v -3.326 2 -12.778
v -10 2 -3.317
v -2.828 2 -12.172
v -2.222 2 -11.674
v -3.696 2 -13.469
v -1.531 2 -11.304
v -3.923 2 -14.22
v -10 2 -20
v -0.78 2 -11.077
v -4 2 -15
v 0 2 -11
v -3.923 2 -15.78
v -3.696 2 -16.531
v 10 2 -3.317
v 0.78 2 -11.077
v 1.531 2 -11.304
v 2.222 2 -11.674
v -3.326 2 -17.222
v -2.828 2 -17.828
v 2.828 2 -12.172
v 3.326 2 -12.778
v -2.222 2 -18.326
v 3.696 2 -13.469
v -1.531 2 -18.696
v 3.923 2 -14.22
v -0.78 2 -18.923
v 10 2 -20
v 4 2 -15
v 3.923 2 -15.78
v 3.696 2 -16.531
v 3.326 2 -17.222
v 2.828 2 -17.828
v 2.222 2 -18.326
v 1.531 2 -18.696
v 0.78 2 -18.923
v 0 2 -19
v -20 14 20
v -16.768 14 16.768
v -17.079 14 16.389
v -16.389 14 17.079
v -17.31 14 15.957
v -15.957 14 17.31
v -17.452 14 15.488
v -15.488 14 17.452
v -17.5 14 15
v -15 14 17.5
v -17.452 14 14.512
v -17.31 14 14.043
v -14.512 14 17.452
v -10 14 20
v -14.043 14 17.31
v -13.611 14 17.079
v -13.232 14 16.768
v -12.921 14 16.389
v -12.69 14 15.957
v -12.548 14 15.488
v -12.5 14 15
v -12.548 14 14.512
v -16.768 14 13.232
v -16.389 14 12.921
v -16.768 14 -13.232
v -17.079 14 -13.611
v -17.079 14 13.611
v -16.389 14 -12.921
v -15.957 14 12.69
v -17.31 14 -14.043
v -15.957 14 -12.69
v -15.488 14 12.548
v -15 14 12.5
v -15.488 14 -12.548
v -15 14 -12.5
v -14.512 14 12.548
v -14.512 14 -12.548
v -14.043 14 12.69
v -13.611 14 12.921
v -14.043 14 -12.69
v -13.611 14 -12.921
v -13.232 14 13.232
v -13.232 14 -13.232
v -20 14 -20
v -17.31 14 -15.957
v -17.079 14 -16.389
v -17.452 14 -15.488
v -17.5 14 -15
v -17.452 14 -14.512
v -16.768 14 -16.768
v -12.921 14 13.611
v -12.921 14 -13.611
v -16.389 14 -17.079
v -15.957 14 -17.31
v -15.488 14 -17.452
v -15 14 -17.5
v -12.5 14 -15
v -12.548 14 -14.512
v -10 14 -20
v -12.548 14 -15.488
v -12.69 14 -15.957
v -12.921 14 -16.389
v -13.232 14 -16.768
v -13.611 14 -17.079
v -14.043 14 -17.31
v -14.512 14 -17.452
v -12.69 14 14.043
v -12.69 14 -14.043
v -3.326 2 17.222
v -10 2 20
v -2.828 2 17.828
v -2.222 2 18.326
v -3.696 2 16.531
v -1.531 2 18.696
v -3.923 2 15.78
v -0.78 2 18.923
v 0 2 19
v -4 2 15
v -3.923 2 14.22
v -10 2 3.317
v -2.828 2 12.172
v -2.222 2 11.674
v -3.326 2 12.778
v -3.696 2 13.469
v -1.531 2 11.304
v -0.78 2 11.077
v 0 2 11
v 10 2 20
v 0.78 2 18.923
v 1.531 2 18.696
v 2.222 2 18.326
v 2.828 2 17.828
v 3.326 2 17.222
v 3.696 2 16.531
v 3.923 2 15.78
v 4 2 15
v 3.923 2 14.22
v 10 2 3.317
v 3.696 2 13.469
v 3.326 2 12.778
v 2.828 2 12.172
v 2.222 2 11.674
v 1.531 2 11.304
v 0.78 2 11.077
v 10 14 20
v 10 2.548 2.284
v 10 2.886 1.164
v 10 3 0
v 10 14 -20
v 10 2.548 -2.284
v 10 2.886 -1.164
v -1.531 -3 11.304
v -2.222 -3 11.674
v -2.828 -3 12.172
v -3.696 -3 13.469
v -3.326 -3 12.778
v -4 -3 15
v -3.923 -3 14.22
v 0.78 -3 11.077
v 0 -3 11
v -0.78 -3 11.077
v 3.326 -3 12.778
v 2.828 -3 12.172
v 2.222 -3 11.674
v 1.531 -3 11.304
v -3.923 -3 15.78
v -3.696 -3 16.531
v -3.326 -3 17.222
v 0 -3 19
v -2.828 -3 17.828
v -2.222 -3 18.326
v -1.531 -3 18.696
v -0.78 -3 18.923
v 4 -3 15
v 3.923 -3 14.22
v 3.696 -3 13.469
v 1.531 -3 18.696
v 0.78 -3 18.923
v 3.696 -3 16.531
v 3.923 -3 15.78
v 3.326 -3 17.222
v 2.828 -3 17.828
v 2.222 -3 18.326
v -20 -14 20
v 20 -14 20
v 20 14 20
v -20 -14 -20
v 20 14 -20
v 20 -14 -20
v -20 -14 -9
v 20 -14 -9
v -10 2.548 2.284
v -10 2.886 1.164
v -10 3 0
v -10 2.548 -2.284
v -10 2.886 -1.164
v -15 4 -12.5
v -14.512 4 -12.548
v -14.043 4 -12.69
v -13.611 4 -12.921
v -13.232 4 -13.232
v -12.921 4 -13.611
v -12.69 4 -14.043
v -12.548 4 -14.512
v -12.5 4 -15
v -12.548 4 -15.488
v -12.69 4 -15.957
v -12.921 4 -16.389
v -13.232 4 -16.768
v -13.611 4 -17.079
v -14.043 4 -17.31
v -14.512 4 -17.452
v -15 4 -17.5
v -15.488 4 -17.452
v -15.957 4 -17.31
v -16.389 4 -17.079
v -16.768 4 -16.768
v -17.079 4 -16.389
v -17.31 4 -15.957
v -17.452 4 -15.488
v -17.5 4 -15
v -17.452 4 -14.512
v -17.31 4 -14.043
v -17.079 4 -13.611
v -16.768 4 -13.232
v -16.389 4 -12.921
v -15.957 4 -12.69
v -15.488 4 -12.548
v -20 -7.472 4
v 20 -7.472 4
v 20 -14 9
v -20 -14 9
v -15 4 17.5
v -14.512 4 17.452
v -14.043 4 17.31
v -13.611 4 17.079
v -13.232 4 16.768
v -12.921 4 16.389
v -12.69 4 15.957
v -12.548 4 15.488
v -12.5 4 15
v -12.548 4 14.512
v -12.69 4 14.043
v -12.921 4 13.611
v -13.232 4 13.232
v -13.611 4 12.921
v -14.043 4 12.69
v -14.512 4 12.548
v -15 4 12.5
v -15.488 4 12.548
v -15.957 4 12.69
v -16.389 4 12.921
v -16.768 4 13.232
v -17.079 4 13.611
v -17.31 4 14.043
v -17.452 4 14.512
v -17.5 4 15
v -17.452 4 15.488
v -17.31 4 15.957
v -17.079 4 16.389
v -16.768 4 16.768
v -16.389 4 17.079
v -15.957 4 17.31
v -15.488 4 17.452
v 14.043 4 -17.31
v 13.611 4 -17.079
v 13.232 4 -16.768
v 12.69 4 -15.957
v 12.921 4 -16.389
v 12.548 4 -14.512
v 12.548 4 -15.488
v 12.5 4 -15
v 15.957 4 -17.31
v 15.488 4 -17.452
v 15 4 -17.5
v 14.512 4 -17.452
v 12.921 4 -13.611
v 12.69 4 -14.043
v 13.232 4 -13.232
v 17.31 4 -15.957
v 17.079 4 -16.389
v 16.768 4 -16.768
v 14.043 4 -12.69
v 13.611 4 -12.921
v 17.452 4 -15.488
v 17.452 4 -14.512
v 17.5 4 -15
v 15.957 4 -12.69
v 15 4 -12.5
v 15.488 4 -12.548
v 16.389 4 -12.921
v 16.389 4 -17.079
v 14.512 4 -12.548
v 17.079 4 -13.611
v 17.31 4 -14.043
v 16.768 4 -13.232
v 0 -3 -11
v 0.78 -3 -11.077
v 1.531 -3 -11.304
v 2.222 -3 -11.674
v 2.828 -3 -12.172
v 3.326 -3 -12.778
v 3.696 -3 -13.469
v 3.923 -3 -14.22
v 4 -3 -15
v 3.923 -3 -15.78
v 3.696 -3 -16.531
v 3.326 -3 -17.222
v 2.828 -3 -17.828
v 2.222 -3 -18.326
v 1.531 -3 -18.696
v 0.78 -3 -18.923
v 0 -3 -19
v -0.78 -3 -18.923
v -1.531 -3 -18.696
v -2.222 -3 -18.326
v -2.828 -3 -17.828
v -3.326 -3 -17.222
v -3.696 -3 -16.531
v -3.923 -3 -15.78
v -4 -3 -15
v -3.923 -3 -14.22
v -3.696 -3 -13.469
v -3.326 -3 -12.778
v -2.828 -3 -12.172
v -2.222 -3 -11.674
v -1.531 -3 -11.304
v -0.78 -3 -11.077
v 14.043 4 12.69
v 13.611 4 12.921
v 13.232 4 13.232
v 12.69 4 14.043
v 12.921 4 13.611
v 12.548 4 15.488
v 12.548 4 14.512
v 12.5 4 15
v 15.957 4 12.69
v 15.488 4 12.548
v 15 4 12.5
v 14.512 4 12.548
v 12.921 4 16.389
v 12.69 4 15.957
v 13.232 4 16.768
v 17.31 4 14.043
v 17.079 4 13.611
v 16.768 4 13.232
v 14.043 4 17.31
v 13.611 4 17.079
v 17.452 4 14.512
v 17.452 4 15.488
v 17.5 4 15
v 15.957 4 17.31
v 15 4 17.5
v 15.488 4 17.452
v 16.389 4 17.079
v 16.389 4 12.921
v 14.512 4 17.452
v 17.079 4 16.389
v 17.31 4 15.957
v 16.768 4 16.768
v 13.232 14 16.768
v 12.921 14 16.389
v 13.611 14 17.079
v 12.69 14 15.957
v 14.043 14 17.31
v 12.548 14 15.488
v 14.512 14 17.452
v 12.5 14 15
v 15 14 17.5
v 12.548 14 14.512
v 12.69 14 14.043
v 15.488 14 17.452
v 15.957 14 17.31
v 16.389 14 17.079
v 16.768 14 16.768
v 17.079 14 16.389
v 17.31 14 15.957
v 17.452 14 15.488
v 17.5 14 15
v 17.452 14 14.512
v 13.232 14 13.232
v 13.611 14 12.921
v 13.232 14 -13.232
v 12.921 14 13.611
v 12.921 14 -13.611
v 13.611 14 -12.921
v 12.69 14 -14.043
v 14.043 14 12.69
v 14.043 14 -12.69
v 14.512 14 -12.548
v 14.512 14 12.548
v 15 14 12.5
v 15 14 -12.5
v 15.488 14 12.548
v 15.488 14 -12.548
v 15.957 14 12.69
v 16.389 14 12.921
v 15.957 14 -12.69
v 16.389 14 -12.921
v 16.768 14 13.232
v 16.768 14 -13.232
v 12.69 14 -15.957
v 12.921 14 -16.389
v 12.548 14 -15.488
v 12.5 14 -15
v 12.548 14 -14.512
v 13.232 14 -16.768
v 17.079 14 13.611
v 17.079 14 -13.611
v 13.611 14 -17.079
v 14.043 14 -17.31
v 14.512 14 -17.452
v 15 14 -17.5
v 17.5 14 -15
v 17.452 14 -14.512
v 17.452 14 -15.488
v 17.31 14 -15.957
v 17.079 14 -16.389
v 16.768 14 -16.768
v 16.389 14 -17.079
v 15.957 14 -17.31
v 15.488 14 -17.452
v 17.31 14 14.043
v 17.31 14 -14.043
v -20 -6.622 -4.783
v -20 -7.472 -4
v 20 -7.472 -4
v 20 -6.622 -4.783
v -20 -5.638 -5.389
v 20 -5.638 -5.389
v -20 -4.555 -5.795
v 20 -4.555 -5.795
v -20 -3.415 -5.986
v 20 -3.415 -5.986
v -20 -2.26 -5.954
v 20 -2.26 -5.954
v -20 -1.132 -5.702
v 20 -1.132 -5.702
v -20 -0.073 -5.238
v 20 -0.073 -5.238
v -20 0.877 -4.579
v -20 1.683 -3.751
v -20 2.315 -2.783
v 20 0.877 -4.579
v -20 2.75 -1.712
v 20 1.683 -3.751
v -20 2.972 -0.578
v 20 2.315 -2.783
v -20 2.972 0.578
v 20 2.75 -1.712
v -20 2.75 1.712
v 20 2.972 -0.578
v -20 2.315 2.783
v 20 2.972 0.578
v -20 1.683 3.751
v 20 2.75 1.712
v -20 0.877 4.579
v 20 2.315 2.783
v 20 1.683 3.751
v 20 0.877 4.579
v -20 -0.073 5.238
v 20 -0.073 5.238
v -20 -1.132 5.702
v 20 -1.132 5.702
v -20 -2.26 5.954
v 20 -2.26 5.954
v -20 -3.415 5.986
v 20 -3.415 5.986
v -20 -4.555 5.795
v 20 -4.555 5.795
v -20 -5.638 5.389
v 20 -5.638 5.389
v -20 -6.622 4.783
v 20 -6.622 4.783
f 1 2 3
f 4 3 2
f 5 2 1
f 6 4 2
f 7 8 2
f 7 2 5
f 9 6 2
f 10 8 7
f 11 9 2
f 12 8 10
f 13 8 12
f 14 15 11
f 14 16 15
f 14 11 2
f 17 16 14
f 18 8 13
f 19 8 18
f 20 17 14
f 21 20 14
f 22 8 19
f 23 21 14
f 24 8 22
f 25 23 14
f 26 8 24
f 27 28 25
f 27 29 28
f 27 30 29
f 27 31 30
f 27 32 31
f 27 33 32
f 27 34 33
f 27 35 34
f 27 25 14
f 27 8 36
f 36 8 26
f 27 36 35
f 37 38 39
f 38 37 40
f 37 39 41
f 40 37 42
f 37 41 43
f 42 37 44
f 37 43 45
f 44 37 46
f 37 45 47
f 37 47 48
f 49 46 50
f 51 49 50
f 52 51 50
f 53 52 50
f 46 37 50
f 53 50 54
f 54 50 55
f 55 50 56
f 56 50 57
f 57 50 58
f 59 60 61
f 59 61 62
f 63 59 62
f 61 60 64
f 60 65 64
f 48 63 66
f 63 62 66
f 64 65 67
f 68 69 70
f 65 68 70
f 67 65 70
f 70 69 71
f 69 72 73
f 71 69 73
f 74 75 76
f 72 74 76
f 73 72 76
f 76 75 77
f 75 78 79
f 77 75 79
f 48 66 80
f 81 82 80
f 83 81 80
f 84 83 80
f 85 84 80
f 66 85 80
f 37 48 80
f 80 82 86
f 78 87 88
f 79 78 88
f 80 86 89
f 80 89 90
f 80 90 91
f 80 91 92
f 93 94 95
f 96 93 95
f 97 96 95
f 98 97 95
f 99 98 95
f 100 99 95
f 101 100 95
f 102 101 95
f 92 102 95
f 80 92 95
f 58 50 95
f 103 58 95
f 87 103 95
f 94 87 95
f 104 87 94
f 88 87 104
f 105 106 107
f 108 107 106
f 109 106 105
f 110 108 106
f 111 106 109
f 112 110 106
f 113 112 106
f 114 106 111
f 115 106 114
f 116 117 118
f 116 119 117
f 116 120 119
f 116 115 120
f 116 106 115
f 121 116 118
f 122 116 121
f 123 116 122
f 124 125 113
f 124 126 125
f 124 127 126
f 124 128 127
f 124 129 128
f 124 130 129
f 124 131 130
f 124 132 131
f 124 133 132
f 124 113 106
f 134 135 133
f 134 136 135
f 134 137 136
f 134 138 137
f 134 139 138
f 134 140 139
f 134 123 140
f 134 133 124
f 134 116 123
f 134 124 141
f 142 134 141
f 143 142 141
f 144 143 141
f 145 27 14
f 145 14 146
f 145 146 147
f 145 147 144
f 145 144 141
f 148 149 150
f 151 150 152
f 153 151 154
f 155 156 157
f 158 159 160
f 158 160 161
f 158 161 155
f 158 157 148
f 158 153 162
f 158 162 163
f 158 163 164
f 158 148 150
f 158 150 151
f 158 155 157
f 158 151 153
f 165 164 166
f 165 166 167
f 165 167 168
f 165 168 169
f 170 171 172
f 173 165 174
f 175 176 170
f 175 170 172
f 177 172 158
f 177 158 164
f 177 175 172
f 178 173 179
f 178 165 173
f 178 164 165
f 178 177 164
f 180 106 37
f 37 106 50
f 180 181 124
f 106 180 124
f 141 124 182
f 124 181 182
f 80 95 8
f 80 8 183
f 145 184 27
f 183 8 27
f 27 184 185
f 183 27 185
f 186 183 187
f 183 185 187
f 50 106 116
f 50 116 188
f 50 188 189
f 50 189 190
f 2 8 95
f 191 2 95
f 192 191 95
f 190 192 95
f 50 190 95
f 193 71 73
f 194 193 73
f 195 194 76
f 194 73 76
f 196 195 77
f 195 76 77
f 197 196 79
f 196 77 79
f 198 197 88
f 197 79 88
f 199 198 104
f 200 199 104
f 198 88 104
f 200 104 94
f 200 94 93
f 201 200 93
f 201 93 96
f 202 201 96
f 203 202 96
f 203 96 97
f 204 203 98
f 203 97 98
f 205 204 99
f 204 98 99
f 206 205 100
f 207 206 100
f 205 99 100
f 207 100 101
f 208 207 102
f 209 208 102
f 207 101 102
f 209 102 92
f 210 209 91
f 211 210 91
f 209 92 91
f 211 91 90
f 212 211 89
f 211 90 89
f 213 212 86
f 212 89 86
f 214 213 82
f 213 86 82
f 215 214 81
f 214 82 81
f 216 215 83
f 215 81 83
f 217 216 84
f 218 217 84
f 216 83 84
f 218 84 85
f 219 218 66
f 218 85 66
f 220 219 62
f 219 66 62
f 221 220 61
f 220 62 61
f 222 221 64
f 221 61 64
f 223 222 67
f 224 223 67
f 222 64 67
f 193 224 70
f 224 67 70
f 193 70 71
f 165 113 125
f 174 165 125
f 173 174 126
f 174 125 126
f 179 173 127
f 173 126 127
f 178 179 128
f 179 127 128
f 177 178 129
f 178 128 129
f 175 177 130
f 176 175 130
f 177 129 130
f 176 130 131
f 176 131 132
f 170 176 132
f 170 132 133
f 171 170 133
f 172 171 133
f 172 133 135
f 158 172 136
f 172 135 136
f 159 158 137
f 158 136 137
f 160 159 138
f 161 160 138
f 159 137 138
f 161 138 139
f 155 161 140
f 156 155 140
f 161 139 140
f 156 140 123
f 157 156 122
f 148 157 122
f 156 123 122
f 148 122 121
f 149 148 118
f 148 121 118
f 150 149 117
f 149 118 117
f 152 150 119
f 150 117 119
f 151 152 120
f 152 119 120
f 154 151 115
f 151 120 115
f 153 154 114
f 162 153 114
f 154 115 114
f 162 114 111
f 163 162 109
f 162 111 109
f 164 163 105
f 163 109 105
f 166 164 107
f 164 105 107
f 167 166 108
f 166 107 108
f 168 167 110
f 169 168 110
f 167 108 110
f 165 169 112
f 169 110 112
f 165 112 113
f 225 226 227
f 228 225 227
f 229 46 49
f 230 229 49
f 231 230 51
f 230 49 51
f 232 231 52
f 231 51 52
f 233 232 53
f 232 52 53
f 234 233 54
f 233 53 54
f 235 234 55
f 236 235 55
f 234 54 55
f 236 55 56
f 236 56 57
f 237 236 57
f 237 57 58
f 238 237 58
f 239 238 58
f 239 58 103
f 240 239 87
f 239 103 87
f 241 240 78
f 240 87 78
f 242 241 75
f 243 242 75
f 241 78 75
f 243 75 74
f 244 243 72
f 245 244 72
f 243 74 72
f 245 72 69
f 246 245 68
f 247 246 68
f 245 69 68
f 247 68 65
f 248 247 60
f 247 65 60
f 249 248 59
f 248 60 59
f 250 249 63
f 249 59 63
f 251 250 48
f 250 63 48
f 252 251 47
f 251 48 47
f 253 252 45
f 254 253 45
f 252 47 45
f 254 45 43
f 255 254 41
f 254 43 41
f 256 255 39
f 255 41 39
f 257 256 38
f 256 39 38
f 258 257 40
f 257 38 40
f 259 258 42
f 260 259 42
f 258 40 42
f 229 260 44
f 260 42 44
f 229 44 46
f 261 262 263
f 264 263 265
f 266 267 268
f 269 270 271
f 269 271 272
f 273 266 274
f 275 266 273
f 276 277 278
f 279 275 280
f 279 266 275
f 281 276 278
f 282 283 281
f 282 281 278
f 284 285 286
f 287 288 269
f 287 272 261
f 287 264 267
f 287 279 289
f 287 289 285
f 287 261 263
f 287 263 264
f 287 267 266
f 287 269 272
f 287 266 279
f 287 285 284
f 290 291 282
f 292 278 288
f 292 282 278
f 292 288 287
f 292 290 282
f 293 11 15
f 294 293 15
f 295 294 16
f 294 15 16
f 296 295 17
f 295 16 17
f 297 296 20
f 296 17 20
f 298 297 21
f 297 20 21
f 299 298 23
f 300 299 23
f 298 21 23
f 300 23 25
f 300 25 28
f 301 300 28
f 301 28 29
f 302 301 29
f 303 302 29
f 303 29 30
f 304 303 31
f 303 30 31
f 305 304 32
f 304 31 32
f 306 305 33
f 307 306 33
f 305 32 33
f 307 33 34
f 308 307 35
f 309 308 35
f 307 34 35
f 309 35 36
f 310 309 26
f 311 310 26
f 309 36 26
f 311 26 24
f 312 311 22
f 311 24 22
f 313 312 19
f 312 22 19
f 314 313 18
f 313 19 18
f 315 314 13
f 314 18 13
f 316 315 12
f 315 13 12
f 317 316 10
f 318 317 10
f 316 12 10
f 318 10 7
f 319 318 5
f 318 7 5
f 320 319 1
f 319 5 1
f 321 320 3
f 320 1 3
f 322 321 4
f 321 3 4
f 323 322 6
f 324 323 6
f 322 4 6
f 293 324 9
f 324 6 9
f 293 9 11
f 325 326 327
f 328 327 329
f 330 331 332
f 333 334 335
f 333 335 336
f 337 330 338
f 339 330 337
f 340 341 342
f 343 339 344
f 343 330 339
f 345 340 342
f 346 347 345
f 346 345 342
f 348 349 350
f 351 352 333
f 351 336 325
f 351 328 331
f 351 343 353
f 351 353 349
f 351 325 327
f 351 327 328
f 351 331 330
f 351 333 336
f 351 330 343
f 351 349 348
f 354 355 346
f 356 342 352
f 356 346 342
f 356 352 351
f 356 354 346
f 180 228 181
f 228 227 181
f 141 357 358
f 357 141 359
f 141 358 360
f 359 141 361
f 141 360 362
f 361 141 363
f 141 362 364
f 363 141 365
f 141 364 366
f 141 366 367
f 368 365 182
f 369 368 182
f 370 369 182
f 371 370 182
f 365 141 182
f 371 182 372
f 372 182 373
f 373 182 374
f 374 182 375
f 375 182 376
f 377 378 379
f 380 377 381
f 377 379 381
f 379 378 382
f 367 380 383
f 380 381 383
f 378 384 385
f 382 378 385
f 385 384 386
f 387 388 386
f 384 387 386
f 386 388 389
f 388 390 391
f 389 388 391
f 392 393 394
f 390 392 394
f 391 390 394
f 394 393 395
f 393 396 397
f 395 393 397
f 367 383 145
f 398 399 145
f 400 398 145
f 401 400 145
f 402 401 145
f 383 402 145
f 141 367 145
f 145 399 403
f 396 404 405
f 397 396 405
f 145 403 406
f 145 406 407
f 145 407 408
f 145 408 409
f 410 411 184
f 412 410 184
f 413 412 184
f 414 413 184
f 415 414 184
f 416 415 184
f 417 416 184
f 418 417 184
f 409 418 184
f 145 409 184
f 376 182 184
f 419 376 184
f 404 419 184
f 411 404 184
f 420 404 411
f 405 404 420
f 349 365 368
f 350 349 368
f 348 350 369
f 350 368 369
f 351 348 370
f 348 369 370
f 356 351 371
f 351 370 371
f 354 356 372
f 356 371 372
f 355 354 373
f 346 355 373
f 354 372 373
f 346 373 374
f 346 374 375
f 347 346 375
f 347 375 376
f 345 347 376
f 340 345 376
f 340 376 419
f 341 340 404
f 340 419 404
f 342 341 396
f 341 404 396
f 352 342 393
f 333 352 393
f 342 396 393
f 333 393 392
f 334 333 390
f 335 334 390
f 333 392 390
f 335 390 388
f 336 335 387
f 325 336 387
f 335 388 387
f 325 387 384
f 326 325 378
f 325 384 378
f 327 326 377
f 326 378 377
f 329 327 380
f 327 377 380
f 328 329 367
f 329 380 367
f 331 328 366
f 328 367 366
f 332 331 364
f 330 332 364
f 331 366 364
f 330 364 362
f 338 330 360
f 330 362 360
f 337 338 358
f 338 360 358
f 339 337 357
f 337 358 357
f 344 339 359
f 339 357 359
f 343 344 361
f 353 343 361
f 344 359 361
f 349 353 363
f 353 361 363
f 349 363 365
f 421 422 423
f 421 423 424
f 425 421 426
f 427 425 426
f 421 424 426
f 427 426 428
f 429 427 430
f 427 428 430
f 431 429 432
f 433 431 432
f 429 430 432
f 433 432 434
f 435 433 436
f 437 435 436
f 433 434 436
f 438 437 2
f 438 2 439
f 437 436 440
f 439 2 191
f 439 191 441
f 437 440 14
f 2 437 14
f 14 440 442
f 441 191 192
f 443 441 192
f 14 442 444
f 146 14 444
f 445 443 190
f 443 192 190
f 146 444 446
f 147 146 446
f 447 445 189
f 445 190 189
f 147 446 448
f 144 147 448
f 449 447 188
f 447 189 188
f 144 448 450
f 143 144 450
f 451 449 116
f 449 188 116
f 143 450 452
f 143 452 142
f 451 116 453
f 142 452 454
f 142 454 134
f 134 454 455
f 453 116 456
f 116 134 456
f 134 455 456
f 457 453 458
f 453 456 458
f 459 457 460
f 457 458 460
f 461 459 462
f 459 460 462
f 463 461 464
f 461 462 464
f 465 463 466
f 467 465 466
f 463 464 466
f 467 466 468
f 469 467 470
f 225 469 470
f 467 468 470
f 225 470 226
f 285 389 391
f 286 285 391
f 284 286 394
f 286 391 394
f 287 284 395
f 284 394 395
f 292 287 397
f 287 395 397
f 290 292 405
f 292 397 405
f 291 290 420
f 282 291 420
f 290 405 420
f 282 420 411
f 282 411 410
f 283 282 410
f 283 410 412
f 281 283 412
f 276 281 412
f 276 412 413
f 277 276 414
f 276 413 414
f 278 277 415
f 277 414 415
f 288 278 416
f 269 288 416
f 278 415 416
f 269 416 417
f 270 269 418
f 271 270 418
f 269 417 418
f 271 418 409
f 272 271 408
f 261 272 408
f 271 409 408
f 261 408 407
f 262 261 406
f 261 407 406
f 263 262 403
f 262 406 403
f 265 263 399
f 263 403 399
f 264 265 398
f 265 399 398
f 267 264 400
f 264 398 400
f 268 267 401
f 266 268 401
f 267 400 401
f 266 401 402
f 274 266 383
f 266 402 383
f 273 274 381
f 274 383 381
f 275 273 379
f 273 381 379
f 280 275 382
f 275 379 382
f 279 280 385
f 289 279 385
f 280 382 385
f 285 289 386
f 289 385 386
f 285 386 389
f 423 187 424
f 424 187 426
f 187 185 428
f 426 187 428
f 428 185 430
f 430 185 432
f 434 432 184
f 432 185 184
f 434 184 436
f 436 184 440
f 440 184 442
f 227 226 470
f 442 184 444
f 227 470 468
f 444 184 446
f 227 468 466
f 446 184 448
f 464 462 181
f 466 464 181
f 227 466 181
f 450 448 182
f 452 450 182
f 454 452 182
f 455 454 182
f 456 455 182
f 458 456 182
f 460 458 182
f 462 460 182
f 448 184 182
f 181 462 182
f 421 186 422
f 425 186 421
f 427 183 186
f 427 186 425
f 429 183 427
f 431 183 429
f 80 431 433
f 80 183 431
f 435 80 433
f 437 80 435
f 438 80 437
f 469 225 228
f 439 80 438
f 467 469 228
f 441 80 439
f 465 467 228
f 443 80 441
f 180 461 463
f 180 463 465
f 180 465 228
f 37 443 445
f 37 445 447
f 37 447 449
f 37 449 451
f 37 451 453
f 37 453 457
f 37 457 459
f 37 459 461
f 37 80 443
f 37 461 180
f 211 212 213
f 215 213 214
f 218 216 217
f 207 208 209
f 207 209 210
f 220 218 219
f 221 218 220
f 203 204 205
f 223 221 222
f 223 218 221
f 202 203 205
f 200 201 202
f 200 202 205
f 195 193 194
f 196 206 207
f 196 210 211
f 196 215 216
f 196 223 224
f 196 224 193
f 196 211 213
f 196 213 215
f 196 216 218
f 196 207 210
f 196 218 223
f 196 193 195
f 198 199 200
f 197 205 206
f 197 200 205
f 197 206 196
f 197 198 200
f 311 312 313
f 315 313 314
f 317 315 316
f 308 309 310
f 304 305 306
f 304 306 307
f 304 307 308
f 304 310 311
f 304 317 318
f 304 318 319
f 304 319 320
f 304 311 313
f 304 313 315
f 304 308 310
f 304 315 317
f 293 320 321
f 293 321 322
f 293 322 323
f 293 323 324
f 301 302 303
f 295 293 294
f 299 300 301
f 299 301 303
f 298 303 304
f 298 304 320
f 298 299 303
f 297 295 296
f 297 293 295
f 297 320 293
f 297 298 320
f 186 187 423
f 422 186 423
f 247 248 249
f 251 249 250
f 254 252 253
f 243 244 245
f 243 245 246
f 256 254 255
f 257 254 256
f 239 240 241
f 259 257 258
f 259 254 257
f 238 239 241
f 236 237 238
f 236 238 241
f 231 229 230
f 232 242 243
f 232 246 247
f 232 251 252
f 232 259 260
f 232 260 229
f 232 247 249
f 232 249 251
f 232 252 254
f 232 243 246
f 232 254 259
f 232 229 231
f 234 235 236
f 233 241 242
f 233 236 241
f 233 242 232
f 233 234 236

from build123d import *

# Parameters (mm, degrees)
EXTRUDE_1_DEPTH          = 20
CUT_EXTRUDE_1_DEPTH      = 32.559467676
CUT_EXTRUDE_1_DEPTH_BACK = 32.559467676
SKETCH_2_W               = 20
SKETCH_2_H               = 19.616393828
SKETCH_3_R               = 4
CUT_EXTRUDE_2_DEPTH      = 5
SKETCH_4_R               = 2.5
CUT_EXTRUDE_3_DEPTH      = 10


with BuildPart() as part:
    # Эскиз1 → Бобышка-Вытянуть1 (new, symmetric)
    with BuildSketch(Plane(origin=(0, 0, 0), x_dir=(0, 0, -1), z_dir=(1, 0, 0))):
        with BuildLine():
            Line((-4, -7.472135955), (-9, -14))
            Line((-9, -14), (-20, -14))
            Line((-20, -14), (-20, 14))
            Line((-20, 14), (20, 14))
            Line((20, 14), (20, -14))
            Line((20, -14), (9, -14))
            Line((9, -14), (4, -7.472135955))
            ThreePointArc((4, -7.472135955), (0, 3), (-4, -7.472135955))
        make_face()
    extrude(amount=EXTRUDE_1_DEPTH, both=True)

    # Эскиз2 → Вырез-Вытянуть1 (cut, two sides: drawn at the far end of the back side and taken through both)
    with BuildSketch(Plane.XY.offset(-CUT_EXTRUDE_1_DEPTH_BACK)):
        with Locations((0, 11.808196914)):
            Rectangle(SKETCH_2_W, SKETCH_2_H)
    extrude(amount=CUT_EXTRUDE_1_DEPTH + CUT_EXTRUDE_1_DEPTH_BACK, mode=Mode.SUBTRACT)

    # Эскиз3 → Вырез-Вытянуть2 (cut)
    with BuildSketch(Plane(origin=(0, 2, 0), x_dir=(1, 0, 0), z_dir=(0, 1, 0))):
        with Locations(Location((0, 15, 0), (0, 0, 270))):
            Circle(SKETCH_3_R)
        with Locations(Location((0, -15, 0), (0, 0, 270))):
            Circle(SKETCH_3_R)
    extrude(amount=-CUT_EXTRUDE_2_DEPTH, mode=Mode.SUBTRACT)

    # Эскиз4 → Вырез-Вытянуть3 (cut)
    with BuildSketch(Plane(origin=(0, 14, 0), x_dir=(1, 0, 0), z_dir=(0, 1, 0))):
        with Locations(Location((-15, 15, 0), (0, 0, 270))):
            Circle(SKETCH_4_R)
        with Locations(Location((-15, -15, 0), (0, 0, 270))):
            Circle(SKETCH_4_R)
        with Locations(Location((15, -15, 0), (0, 0, 270))):
            Circle(SKETCH_4_R)
        with Locations(Location((15, 15, 0), (0, 0, 270))):
            Circle(SKETCH_4_R)
    extrude(amount=-CUT_EXTRUDE_3_DEPTH, mode=Mode.SUBTRACT)


solid = part.part
